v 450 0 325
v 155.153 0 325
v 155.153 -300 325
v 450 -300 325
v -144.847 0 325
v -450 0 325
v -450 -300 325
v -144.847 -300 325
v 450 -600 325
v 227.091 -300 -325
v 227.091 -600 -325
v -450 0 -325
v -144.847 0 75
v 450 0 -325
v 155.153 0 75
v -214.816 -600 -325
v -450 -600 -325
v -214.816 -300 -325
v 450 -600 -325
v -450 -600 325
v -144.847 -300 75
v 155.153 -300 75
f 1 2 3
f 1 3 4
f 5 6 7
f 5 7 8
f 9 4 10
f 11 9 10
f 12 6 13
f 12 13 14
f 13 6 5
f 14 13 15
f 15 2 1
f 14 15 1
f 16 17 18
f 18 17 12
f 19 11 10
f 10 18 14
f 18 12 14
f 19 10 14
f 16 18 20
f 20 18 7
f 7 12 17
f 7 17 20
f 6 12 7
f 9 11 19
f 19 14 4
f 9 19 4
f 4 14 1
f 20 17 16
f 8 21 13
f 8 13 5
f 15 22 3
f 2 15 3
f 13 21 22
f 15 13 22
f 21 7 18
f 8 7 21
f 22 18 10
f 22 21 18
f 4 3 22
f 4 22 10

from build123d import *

# Parameters (mm, degrees)
F0_W     = 900
F0_H     = 650
F1_DEPTH = 300
F3_DEPTH = 300
F4_W     = 300
F4_H     = 250
F5_DEPTH = 300.001


with BuildPart() as f1:
    # F0 (on Front) → F1 (new body)
    with BuildSketch(Plane.XZ):
        Rectangle(F0_W, F0_H)
    extrude(amount=F1_DEPTH)

    # F2 (on face) → F3 (join)
    with BuildSketch(Plane.XZ.offset(300)):
        Polygon((450, -325), (450, 325), (227.090806, -325), align=None)
        Polygon((-214.815646, -325), (-450, 325), (-450, -325), align=None)
    extrude(amount=F3_DEPTH)

    # F4 (on face) → F5 (cut, through all)
    with BuildSketch(Plane.XZ.offset(300)):
        with Locations((5.15289, 200)):
            Rectangle(F4_W, F4_H)
    extrude(amount=-F5_DEPTH, mode=Mode.SUBTRACT)


solid = f1.part
